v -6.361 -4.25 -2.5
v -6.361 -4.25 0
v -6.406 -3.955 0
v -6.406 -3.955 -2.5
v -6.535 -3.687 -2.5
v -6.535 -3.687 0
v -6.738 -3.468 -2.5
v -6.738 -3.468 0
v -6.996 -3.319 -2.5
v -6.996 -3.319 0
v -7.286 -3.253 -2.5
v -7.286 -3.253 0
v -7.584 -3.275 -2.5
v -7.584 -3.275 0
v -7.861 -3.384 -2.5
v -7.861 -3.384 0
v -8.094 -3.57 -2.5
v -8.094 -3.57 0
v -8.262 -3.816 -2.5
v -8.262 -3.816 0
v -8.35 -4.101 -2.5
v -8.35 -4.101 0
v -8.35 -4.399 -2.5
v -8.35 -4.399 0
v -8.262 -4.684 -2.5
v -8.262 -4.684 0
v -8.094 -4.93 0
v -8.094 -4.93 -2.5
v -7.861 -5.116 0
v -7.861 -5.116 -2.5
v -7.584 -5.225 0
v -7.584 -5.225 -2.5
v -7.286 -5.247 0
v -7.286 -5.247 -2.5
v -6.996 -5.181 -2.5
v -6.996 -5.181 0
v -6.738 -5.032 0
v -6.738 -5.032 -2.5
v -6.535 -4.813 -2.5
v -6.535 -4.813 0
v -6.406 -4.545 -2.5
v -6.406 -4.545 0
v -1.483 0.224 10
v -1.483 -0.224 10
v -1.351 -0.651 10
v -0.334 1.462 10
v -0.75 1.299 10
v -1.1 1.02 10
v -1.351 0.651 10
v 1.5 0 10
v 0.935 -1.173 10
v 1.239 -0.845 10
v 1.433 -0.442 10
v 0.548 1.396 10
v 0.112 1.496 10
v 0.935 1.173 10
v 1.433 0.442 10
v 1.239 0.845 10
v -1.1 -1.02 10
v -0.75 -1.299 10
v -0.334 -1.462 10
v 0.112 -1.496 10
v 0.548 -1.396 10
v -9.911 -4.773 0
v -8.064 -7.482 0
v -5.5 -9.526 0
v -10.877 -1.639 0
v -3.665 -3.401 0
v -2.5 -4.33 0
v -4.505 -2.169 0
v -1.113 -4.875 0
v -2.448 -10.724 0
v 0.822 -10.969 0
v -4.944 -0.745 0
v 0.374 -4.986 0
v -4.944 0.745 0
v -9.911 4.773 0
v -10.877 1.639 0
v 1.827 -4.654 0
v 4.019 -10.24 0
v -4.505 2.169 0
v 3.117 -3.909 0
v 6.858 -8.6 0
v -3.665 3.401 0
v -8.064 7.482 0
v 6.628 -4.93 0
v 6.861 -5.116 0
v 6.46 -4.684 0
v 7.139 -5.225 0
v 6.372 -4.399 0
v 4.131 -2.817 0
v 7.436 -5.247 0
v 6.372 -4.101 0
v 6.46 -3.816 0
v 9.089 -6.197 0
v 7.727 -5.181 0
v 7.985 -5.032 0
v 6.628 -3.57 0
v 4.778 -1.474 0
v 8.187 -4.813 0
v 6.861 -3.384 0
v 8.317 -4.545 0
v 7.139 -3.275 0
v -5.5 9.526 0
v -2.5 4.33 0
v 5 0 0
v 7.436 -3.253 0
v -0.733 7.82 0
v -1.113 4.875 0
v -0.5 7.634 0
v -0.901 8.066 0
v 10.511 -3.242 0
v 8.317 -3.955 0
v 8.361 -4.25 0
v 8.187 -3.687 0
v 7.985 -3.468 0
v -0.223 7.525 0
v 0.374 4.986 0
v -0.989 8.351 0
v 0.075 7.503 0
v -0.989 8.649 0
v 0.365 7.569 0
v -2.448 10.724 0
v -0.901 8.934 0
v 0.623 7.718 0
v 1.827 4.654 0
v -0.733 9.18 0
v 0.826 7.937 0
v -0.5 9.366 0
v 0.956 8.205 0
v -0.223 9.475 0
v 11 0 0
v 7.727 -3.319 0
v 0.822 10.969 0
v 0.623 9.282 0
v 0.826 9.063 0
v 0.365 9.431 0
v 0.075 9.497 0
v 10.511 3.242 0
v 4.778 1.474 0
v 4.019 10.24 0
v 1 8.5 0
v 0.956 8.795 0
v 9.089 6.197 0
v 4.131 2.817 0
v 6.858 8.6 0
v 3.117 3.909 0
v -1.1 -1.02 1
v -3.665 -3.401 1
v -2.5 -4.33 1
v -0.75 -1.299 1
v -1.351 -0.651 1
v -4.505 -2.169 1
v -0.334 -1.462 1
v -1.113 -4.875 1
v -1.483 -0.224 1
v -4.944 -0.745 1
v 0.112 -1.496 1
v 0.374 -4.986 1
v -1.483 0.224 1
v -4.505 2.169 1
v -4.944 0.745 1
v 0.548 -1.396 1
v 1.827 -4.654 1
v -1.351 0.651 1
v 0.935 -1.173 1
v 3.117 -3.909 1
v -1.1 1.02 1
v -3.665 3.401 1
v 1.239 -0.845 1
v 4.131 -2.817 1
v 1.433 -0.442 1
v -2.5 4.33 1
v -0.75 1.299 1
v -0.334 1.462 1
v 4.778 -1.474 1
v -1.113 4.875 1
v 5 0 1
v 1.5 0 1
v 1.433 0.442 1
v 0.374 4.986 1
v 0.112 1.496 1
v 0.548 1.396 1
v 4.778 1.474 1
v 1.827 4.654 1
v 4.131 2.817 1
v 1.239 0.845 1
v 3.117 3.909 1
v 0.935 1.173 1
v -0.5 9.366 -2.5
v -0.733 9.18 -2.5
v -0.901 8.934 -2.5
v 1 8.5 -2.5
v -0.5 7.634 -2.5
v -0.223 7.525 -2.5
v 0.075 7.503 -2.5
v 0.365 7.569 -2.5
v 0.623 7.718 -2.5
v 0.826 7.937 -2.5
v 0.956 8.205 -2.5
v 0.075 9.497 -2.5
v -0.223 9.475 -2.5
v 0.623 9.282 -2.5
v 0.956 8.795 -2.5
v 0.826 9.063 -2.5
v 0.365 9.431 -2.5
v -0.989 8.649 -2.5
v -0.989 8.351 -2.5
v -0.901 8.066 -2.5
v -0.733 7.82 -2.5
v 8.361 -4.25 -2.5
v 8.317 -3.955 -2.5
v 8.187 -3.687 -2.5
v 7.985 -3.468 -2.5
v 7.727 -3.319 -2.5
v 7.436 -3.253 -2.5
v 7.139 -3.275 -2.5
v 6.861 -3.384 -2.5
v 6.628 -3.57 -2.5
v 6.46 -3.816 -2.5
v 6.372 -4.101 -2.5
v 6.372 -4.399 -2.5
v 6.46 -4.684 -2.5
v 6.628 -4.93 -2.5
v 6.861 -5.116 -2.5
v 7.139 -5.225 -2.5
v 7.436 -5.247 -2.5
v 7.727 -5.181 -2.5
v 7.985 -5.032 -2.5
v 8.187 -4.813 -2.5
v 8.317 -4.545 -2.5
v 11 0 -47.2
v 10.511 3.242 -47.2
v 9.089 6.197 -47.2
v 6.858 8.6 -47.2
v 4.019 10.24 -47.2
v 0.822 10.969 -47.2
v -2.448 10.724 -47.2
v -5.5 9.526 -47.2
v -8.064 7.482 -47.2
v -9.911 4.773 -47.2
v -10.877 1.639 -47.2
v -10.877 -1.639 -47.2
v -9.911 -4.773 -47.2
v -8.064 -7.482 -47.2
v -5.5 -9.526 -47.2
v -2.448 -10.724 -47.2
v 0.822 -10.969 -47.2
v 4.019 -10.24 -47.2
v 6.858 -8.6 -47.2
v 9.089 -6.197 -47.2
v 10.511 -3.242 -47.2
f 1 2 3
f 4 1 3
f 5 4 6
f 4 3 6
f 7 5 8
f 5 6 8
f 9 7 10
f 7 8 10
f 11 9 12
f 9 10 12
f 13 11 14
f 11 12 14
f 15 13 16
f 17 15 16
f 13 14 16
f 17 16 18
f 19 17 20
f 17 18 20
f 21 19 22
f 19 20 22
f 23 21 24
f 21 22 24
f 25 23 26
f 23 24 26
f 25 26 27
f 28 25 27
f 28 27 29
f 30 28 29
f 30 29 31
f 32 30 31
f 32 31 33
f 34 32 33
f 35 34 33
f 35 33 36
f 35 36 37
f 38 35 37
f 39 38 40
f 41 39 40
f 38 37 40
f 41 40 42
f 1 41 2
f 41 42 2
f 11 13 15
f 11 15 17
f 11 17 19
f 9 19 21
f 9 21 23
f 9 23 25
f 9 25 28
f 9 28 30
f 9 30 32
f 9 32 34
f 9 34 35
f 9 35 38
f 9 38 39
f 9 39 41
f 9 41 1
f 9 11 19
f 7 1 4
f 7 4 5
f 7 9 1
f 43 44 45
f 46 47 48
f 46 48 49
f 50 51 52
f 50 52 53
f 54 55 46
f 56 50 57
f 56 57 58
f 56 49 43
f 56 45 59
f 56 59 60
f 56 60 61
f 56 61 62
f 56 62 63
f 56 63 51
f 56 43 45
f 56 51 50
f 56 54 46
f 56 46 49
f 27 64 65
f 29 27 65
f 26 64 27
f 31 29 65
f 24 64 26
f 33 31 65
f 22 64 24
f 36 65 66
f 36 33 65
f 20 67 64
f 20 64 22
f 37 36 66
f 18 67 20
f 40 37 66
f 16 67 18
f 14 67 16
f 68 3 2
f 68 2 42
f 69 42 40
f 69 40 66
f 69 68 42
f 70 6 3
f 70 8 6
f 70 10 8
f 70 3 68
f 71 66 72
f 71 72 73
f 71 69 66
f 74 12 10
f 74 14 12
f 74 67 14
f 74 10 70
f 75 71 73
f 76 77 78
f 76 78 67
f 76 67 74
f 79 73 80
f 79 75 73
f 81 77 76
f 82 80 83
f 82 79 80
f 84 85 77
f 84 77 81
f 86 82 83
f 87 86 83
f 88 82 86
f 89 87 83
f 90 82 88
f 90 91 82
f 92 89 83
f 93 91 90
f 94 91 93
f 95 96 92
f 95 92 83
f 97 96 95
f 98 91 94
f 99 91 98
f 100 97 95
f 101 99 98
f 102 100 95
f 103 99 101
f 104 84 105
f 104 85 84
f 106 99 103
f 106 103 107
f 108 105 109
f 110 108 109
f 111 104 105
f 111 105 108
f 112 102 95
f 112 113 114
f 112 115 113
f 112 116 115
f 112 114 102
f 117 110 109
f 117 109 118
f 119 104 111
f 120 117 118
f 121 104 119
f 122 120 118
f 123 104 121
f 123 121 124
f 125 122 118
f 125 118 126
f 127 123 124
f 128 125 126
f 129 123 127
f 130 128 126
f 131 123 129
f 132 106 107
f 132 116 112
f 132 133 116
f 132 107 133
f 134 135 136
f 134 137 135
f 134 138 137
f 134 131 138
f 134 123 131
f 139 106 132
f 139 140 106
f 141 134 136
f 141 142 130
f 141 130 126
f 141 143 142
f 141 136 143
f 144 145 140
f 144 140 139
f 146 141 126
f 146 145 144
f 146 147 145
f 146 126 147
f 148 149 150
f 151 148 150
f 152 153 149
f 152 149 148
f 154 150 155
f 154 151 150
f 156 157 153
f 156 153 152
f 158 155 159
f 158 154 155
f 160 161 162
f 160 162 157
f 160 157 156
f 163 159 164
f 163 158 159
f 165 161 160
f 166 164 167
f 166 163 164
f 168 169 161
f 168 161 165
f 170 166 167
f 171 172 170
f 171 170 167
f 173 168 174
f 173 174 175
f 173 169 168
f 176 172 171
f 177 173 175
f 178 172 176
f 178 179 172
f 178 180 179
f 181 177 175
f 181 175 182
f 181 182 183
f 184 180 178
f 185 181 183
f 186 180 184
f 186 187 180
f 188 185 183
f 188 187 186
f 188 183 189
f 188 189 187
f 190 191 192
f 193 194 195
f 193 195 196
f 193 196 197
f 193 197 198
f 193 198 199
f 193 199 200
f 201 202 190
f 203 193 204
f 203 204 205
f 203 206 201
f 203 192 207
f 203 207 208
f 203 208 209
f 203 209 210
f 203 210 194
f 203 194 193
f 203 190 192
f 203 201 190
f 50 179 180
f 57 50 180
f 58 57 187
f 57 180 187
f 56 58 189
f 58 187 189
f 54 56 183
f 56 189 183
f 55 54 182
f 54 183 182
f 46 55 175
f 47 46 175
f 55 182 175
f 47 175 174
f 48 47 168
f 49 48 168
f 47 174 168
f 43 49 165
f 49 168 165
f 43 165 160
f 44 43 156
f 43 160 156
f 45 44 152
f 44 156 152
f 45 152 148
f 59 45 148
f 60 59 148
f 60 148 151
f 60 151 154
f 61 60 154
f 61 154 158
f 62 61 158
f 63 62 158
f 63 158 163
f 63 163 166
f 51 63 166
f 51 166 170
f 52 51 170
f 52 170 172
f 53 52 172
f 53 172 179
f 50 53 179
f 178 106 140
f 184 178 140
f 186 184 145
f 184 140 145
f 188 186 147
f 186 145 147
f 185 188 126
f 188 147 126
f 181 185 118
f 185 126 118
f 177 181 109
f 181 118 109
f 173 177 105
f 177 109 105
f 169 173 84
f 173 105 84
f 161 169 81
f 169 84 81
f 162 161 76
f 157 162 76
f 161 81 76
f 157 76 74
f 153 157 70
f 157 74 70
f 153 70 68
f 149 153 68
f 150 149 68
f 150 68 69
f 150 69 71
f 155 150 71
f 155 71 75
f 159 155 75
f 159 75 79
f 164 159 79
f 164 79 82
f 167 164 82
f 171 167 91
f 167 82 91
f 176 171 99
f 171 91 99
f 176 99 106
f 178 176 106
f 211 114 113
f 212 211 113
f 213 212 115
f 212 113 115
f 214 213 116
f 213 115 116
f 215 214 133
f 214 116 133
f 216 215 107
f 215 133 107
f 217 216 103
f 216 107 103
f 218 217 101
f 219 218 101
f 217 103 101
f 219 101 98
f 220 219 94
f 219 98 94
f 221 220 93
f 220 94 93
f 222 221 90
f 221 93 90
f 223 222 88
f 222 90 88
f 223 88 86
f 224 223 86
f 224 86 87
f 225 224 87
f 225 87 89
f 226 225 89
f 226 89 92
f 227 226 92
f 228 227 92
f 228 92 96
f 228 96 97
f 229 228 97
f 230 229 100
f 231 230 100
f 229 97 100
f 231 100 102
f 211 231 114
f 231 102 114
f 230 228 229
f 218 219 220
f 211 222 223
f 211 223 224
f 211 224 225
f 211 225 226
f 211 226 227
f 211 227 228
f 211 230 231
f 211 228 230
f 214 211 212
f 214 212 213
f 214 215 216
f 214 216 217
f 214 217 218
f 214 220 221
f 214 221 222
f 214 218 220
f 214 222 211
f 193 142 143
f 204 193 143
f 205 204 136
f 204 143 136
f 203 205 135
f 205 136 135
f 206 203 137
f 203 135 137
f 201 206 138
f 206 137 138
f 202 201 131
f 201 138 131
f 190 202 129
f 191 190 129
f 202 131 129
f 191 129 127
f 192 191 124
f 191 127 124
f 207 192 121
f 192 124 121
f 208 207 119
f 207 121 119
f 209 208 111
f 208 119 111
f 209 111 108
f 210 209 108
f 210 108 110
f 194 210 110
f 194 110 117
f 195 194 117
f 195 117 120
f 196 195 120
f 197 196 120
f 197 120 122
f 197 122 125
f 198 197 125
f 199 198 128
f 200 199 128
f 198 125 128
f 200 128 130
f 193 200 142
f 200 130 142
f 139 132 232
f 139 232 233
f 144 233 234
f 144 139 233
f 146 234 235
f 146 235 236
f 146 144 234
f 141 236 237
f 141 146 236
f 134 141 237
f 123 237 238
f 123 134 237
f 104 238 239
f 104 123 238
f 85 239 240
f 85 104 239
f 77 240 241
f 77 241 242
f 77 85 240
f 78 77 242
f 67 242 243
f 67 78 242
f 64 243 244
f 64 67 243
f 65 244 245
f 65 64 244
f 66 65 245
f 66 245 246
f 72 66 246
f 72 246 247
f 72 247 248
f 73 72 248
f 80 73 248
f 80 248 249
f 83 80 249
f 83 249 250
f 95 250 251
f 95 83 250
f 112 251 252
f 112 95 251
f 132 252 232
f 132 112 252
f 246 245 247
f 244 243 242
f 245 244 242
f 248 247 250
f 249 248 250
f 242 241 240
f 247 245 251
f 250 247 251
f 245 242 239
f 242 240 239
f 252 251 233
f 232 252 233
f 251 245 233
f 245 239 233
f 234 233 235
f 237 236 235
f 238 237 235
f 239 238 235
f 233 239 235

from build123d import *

# Parameters (mm, degrees)
SKETCH1_R           = 11
BOSS_EXTRUDE1_DEPTH = 47.2
SKETCH2_R           = 5
BOSS_EXTRUDE2_DEPTH = 1
SKETCH3_R           = 1.5
BOSS_EXTRUDE3_DEPTH = 10
SKETCH4_R           = 1
CUT_EXTRUDE1_DEPTH  = 2.5


with BuildPart() as part:
    # Sketch1 → Boss-Extrude1 (new body)
    with BuildSketch(Plane.XY):
        Circle(SKETCH1_R)
    extrude(amount=-BOSS_EXTRUDE1_DEPTH)

    # Sketch2 → Boss-Extrude2 (add)
    with BuildSketch(Plane.XY):
        Circle(SKETCH2_R)
    extrude(amount=BOSS_EXTRUDE2_DEPTH)

    # Sketch3 → Boss-Extrude3 (add)
    with BuildSketch(Plane.XY):
        Circle(SKETCH3_R)
    extrude(amount=BOSS_EXTRUDE3_DEPTH)

    # Sketch4 → Cut-Extrude1 (cut)
    with BuildSketch(Plane.XY):
        with Locations((0, 8.5)):
            Circle(SKETCH4_R)
        with Locations((7.361215932, -4.25)):
            Circle(SKETCH4_R)
        with Locations((-7.361215932, -4.25)):
            Circle(SKETCH4_R)
    extrude(amount=-CUT_EXTRUDE1_DEPTH, mode=Mode.SUBTRACT)


solid = part.part
